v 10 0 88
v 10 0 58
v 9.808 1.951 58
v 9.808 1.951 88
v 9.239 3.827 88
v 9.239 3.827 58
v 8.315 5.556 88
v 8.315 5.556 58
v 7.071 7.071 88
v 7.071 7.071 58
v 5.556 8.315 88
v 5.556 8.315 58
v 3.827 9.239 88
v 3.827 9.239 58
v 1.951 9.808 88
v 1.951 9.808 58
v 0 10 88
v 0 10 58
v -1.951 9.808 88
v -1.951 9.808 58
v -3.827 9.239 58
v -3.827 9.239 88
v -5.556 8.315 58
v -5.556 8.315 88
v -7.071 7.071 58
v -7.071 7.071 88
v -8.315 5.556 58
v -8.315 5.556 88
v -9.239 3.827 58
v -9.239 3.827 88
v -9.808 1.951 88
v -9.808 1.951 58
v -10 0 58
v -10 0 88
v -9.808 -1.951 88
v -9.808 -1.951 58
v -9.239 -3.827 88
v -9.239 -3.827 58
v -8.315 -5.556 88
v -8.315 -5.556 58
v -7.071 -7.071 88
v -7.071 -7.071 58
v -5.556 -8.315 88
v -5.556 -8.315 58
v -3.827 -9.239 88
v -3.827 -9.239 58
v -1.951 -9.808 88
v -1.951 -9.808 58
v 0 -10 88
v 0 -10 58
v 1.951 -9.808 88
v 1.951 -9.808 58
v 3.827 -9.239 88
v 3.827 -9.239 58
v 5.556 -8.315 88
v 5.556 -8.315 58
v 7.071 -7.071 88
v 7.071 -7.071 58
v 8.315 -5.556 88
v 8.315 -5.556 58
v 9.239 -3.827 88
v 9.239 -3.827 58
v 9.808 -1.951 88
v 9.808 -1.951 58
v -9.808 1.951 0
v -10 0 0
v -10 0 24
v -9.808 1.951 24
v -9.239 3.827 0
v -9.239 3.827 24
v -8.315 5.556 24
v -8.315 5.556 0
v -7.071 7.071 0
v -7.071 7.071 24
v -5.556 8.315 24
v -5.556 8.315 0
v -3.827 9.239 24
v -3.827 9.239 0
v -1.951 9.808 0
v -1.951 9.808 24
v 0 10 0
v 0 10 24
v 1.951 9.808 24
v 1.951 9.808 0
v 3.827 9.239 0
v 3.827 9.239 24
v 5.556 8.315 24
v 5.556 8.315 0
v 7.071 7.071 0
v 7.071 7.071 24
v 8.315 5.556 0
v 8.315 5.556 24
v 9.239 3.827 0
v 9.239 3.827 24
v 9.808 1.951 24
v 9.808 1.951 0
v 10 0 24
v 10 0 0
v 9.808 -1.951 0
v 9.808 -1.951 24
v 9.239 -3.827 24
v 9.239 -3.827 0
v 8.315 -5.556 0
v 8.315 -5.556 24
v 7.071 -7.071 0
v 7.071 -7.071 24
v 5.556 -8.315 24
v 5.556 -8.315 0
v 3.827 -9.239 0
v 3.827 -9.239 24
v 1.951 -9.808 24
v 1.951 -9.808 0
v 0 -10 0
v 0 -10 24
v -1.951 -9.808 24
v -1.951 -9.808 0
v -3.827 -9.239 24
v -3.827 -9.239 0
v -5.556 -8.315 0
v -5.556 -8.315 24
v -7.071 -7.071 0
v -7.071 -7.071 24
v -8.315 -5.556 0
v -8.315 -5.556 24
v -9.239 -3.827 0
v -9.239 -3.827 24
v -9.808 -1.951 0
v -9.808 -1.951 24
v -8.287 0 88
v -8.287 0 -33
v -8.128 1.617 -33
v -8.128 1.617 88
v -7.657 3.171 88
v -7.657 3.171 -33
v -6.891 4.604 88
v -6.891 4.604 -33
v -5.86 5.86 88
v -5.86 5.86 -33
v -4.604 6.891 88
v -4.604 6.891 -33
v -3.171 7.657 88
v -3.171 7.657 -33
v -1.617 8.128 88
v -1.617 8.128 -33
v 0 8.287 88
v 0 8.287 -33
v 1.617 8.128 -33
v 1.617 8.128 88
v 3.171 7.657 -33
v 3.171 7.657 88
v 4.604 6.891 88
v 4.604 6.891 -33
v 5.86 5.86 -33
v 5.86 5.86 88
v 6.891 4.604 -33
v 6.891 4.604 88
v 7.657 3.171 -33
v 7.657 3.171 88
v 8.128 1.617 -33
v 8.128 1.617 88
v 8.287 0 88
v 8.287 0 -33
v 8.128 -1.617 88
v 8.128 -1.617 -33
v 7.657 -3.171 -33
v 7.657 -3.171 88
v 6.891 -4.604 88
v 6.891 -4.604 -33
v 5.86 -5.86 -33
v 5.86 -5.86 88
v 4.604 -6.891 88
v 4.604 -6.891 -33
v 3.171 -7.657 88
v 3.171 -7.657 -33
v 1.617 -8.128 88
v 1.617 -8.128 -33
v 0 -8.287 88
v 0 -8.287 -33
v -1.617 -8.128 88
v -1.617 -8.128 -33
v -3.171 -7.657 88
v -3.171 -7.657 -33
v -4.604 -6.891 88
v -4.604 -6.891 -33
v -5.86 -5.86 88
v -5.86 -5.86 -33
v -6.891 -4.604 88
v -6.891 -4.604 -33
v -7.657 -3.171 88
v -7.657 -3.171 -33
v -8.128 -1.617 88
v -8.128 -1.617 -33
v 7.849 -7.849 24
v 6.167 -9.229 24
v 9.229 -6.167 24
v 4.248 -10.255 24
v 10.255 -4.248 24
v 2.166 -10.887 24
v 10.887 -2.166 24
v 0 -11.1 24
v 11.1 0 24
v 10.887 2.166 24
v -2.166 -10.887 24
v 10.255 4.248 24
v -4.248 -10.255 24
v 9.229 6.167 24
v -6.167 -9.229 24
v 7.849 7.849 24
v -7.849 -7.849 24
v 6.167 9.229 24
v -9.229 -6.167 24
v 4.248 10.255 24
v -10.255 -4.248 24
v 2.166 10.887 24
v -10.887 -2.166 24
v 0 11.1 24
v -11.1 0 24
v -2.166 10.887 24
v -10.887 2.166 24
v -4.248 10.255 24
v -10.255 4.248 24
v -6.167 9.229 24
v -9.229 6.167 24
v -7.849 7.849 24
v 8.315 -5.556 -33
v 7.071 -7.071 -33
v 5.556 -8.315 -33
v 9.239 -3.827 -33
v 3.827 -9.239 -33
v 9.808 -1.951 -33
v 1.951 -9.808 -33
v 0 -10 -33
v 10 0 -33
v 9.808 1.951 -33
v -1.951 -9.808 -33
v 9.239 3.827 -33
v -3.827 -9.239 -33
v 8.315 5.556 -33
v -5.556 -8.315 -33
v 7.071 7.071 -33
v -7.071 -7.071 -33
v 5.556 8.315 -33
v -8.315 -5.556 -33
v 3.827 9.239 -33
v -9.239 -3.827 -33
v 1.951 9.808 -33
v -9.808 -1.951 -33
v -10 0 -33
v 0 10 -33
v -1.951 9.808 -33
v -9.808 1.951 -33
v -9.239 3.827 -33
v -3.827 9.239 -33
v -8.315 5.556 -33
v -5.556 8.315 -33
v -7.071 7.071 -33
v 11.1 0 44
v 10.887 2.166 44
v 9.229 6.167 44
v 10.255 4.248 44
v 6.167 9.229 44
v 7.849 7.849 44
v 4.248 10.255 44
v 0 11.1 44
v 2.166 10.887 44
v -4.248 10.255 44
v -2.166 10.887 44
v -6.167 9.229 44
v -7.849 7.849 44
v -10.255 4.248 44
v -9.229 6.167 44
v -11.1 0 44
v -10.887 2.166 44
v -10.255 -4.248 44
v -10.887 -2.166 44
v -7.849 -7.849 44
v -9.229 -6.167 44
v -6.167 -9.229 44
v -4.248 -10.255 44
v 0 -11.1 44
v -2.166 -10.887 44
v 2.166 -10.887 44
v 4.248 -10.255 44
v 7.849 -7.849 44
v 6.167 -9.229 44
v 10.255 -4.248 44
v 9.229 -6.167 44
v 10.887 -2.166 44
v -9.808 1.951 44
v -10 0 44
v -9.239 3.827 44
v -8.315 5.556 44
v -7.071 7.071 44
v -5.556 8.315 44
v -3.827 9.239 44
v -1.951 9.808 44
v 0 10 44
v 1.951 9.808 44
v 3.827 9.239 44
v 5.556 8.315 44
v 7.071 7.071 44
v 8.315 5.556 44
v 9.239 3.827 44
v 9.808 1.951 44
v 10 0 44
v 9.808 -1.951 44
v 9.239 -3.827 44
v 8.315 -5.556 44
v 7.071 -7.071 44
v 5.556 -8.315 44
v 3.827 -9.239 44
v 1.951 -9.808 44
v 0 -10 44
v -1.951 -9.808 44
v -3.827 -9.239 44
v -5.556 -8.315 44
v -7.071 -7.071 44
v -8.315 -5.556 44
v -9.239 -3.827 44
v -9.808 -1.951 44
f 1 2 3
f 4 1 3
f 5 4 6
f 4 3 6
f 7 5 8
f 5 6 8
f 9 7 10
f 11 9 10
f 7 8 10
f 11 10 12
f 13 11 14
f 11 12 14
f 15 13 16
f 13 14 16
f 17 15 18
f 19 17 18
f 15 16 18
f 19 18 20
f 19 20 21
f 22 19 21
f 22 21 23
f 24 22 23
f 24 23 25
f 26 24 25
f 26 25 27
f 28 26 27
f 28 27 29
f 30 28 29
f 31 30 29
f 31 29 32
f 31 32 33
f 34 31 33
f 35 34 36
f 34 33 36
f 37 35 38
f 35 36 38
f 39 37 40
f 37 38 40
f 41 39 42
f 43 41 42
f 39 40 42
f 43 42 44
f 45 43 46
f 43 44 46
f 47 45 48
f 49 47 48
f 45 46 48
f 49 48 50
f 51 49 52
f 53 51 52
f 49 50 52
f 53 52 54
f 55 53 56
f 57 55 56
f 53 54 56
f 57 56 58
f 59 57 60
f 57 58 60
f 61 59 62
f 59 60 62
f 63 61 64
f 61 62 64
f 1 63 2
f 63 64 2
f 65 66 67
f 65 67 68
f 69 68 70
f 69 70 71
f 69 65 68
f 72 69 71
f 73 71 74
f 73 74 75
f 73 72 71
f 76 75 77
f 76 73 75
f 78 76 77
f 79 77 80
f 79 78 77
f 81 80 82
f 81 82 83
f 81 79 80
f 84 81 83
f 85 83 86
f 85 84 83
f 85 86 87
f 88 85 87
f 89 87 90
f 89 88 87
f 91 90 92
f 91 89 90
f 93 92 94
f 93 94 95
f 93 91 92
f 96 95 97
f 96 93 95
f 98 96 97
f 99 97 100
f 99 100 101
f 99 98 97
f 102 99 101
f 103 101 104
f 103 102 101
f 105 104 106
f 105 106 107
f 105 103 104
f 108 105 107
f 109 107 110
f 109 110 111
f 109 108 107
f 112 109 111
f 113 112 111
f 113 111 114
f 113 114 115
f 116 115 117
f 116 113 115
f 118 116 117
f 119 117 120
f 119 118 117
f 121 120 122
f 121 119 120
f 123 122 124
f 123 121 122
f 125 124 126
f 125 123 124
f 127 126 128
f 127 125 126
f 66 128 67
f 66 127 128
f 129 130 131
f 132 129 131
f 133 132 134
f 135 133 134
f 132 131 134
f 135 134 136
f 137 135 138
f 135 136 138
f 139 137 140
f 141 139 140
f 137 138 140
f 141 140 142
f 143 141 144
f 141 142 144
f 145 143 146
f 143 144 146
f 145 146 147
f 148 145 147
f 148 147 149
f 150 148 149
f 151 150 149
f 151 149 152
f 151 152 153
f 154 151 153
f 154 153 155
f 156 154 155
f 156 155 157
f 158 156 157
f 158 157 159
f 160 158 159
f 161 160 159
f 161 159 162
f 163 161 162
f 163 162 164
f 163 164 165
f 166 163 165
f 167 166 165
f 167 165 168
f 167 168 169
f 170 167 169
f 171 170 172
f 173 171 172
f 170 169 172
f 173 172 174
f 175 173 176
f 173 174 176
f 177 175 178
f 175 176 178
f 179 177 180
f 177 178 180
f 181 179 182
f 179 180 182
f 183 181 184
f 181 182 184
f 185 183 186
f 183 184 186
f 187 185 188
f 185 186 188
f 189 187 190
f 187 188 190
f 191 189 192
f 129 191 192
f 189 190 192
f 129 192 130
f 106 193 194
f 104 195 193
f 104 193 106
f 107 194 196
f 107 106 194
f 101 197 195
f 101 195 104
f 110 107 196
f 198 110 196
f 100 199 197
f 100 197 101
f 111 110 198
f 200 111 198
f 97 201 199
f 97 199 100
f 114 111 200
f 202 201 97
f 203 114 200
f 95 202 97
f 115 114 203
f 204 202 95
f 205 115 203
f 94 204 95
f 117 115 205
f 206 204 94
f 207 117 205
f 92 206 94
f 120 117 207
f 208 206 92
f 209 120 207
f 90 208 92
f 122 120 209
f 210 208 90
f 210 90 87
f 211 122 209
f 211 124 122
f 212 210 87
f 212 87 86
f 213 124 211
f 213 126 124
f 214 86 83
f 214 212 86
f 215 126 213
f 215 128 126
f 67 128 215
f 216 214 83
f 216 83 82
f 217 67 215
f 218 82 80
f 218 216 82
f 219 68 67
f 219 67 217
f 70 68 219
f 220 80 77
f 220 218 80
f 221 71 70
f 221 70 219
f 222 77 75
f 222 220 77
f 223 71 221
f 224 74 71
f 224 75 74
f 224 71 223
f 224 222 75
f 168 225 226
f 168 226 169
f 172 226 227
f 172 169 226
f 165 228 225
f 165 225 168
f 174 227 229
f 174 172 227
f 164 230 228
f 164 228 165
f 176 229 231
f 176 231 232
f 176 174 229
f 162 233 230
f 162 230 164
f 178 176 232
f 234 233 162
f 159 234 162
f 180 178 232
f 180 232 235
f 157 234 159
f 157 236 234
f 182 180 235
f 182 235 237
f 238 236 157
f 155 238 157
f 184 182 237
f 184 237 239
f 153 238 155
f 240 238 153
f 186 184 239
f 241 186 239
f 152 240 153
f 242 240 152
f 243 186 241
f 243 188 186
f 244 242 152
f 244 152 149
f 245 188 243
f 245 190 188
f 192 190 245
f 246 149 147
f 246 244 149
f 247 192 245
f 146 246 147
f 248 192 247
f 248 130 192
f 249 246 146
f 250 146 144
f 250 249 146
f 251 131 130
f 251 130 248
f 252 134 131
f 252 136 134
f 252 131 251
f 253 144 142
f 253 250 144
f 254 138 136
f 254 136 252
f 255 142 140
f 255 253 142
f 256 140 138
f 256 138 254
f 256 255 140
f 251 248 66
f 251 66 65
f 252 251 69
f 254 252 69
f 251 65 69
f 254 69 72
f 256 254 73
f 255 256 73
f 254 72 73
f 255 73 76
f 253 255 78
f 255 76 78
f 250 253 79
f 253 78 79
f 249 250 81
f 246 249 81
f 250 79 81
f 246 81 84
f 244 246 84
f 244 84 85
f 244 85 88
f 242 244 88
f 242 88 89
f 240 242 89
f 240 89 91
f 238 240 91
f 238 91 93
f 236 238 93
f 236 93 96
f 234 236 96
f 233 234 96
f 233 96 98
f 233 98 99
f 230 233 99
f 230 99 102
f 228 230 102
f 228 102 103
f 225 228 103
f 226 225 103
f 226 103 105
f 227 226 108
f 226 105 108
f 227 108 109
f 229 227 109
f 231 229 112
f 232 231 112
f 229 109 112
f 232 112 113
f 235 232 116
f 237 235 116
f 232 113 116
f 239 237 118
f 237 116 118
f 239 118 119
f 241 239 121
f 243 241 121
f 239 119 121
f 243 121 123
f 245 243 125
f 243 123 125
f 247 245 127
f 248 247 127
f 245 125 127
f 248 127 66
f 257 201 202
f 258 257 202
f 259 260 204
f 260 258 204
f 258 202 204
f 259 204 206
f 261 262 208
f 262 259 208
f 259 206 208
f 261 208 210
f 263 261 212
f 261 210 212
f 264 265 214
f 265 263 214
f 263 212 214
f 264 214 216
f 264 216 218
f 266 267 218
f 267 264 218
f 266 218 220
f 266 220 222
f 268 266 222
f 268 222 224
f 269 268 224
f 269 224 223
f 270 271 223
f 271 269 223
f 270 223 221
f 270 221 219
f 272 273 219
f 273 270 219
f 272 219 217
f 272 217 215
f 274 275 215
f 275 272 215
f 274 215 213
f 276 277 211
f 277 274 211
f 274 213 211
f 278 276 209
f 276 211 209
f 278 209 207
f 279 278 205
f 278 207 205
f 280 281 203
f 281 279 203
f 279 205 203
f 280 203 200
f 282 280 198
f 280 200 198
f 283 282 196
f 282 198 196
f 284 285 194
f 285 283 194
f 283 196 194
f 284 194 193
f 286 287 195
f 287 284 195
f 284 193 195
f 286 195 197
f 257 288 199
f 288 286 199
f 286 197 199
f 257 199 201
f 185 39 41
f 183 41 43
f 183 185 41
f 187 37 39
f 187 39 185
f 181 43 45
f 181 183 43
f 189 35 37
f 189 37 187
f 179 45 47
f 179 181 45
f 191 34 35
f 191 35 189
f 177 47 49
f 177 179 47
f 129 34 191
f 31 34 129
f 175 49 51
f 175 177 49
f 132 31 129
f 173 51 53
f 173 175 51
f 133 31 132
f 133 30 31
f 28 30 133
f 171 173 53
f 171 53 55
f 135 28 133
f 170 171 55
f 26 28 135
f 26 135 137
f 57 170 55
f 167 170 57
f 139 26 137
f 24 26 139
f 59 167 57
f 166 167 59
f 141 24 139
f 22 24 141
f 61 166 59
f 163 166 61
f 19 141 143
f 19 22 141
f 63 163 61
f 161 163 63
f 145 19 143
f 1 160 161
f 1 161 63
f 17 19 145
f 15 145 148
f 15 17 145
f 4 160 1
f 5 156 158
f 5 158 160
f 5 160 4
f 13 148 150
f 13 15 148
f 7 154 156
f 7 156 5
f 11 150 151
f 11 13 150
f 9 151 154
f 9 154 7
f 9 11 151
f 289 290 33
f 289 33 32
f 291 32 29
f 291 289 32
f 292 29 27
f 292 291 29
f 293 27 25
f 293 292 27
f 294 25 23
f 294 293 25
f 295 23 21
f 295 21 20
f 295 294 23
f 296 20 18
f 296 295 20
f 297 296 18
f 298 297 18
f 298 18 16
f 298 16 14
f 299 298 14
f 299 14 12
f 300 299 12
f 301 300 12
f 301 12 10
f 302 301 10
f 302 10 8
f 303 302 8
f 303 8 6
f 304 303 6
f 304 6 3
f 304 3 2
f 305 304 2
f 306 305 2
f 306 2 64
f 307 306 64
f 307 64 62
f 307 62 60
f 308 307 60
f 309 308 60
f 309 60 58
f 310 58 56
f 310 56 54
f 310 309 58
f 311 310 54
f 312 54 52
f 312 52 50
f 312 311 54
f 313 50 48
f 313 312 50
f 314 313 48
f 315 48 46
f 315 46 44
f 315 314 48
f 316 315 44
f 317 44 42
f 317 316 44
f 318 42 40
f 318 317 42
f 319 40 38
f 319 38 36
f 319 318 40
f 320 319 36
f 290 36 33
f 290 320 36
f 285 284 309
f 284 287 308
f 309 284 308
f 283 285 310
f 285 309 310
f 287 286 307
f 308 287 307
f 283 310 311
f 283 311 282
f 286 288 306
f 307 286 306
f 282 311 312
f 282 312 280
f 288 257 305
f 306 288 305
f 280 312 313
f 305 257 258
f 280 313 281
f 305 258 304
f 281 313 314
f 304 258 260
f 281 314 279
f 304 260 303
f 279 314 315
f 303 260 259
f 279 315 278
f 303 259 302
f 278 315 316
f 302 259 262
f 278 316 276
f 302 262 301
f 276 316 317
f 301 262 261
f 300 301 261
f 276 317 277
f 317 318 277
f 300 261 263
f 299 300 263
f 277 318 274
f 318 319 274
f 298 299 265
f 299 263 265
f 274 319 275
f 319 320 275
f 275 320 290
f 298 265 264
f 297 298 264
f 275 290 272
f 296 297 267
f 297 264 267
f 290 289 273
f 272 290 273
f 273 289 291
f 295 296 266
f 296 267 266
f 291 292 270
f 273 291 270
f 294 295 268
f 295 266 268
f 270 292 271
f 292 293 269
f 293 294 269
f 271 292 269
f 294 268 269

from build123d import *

# Parameters (mm, degrees)
SKETCH1_R           = 11.1
BOSS_EXTRUDE1_DEPTH = 58
SKETCH2_R           = 24.777888598
SKETCH2_R_2         = 10
CUT_EXTRUDE1_DEPTH  = 24
CUT_EXTRUDE2_START  = -44
SKETCH2_2_R         = 24.777888598
SKETCH2_2_R_2       = 10
CUT_EXTRUDE2_DEPTH  = 14
SKETCH4_R           = 10
BOSS_EXTRUDE3_DEPTH = 30
BOSS_EXTRUDE4_START = 45
SKETCH5_R           = 10
BOSS_EXTRUDE4_DEPTH = 45
SKETCH6_R           = 10
CUT_EXTRUDE3_DEPTH  = 12
SKETCH7_R           = 8.287445099
CUT_EXTRUDE4_DEPTH  = 123.014015588


with BuildPart() as part:
    # Sketch1 → Boss-Extrude1 (new body)
    with BuildSketch(Plane.XY):
        Circle(SKETCH1_R)
    extrude(amount=BOSS_EXTRUDE1_DEPTH)

    # Sketch2 → Cut-Extrude1 (cut)
    with BuildSketch(Plane(origin=(0, 0, 0), x_dir=(-1, 0, 0), z_dir=(0, 0, -1))):
        Circle(SKETCH2_R)
        Circle(SKETCH2_R_2, mode=Mode.SUBTRACT)
    extrude(amount=-CUT_EXTRUDE1_DEPTH, mode=Mode.SUBTRACT)

    # Sketch2<2> → Cut-Extrude2 (cut)
    with BuildSketch(Plane(origin=(0, 0, 0), x_dir=(-1, 0, 0), z_dir=(0, 0, -1)).offset(CUT_EXTRUDE2_START)):
        Circle(SKETCH2_2_R)
        Circle(SKETCH2_2_R_2, mode=Mode.SUBTRACT)
    extrude(amount=-CUT_EXTRUDE2_DEPTH, mode=Mode.SUBTRACT)

    # Sketch4 → Boss-Extrude3 (add)
    with BuildSketch(Plane.XY.offset(58)):
        Circle(SKETCH4_R)
    extrude(amount=BOSS_EXTRUDE3_DEPTH)

    # Sketch5 → Boss-Extrude4 (add)
    with BuildSketch(Plane(origin=(0, 0, 0), x_dir=(-1, 0, 0), z_dir=(0, 0, -1)).offset(BOSS_EXTRUDE4_START)):
        Circle(SKETCH5_R)
    extrude(amount=-BOSS_EXTRUDE4_DEPTH)

    # Sketch6 → Cut-Extrude3 (cut)
    with BuildSketch(Plane(origin=(0, 0, -45), x_dir=(-1, 0, 0), z_dir=(0, 0, -1))):
        Circle(SKETCH6_R)
    extrude(amount=-CUT_EXTRUDE3_DEPTH, mode=Mode.SUBTRACT)

    # Sketch7 → Cut-Extrude4 (cut, through all)
    with BuildSketch(Plane(origin=(0, 0, -33), x_dir=(-1, 0, 0), z_dir=(0, 0, -1))):
        Circle(SKETCH7_R)
    extrude(amount=-CUT_EXTRUDE4_DEPTH, mode=Mode.SUBTRACT)


solid = part.part
